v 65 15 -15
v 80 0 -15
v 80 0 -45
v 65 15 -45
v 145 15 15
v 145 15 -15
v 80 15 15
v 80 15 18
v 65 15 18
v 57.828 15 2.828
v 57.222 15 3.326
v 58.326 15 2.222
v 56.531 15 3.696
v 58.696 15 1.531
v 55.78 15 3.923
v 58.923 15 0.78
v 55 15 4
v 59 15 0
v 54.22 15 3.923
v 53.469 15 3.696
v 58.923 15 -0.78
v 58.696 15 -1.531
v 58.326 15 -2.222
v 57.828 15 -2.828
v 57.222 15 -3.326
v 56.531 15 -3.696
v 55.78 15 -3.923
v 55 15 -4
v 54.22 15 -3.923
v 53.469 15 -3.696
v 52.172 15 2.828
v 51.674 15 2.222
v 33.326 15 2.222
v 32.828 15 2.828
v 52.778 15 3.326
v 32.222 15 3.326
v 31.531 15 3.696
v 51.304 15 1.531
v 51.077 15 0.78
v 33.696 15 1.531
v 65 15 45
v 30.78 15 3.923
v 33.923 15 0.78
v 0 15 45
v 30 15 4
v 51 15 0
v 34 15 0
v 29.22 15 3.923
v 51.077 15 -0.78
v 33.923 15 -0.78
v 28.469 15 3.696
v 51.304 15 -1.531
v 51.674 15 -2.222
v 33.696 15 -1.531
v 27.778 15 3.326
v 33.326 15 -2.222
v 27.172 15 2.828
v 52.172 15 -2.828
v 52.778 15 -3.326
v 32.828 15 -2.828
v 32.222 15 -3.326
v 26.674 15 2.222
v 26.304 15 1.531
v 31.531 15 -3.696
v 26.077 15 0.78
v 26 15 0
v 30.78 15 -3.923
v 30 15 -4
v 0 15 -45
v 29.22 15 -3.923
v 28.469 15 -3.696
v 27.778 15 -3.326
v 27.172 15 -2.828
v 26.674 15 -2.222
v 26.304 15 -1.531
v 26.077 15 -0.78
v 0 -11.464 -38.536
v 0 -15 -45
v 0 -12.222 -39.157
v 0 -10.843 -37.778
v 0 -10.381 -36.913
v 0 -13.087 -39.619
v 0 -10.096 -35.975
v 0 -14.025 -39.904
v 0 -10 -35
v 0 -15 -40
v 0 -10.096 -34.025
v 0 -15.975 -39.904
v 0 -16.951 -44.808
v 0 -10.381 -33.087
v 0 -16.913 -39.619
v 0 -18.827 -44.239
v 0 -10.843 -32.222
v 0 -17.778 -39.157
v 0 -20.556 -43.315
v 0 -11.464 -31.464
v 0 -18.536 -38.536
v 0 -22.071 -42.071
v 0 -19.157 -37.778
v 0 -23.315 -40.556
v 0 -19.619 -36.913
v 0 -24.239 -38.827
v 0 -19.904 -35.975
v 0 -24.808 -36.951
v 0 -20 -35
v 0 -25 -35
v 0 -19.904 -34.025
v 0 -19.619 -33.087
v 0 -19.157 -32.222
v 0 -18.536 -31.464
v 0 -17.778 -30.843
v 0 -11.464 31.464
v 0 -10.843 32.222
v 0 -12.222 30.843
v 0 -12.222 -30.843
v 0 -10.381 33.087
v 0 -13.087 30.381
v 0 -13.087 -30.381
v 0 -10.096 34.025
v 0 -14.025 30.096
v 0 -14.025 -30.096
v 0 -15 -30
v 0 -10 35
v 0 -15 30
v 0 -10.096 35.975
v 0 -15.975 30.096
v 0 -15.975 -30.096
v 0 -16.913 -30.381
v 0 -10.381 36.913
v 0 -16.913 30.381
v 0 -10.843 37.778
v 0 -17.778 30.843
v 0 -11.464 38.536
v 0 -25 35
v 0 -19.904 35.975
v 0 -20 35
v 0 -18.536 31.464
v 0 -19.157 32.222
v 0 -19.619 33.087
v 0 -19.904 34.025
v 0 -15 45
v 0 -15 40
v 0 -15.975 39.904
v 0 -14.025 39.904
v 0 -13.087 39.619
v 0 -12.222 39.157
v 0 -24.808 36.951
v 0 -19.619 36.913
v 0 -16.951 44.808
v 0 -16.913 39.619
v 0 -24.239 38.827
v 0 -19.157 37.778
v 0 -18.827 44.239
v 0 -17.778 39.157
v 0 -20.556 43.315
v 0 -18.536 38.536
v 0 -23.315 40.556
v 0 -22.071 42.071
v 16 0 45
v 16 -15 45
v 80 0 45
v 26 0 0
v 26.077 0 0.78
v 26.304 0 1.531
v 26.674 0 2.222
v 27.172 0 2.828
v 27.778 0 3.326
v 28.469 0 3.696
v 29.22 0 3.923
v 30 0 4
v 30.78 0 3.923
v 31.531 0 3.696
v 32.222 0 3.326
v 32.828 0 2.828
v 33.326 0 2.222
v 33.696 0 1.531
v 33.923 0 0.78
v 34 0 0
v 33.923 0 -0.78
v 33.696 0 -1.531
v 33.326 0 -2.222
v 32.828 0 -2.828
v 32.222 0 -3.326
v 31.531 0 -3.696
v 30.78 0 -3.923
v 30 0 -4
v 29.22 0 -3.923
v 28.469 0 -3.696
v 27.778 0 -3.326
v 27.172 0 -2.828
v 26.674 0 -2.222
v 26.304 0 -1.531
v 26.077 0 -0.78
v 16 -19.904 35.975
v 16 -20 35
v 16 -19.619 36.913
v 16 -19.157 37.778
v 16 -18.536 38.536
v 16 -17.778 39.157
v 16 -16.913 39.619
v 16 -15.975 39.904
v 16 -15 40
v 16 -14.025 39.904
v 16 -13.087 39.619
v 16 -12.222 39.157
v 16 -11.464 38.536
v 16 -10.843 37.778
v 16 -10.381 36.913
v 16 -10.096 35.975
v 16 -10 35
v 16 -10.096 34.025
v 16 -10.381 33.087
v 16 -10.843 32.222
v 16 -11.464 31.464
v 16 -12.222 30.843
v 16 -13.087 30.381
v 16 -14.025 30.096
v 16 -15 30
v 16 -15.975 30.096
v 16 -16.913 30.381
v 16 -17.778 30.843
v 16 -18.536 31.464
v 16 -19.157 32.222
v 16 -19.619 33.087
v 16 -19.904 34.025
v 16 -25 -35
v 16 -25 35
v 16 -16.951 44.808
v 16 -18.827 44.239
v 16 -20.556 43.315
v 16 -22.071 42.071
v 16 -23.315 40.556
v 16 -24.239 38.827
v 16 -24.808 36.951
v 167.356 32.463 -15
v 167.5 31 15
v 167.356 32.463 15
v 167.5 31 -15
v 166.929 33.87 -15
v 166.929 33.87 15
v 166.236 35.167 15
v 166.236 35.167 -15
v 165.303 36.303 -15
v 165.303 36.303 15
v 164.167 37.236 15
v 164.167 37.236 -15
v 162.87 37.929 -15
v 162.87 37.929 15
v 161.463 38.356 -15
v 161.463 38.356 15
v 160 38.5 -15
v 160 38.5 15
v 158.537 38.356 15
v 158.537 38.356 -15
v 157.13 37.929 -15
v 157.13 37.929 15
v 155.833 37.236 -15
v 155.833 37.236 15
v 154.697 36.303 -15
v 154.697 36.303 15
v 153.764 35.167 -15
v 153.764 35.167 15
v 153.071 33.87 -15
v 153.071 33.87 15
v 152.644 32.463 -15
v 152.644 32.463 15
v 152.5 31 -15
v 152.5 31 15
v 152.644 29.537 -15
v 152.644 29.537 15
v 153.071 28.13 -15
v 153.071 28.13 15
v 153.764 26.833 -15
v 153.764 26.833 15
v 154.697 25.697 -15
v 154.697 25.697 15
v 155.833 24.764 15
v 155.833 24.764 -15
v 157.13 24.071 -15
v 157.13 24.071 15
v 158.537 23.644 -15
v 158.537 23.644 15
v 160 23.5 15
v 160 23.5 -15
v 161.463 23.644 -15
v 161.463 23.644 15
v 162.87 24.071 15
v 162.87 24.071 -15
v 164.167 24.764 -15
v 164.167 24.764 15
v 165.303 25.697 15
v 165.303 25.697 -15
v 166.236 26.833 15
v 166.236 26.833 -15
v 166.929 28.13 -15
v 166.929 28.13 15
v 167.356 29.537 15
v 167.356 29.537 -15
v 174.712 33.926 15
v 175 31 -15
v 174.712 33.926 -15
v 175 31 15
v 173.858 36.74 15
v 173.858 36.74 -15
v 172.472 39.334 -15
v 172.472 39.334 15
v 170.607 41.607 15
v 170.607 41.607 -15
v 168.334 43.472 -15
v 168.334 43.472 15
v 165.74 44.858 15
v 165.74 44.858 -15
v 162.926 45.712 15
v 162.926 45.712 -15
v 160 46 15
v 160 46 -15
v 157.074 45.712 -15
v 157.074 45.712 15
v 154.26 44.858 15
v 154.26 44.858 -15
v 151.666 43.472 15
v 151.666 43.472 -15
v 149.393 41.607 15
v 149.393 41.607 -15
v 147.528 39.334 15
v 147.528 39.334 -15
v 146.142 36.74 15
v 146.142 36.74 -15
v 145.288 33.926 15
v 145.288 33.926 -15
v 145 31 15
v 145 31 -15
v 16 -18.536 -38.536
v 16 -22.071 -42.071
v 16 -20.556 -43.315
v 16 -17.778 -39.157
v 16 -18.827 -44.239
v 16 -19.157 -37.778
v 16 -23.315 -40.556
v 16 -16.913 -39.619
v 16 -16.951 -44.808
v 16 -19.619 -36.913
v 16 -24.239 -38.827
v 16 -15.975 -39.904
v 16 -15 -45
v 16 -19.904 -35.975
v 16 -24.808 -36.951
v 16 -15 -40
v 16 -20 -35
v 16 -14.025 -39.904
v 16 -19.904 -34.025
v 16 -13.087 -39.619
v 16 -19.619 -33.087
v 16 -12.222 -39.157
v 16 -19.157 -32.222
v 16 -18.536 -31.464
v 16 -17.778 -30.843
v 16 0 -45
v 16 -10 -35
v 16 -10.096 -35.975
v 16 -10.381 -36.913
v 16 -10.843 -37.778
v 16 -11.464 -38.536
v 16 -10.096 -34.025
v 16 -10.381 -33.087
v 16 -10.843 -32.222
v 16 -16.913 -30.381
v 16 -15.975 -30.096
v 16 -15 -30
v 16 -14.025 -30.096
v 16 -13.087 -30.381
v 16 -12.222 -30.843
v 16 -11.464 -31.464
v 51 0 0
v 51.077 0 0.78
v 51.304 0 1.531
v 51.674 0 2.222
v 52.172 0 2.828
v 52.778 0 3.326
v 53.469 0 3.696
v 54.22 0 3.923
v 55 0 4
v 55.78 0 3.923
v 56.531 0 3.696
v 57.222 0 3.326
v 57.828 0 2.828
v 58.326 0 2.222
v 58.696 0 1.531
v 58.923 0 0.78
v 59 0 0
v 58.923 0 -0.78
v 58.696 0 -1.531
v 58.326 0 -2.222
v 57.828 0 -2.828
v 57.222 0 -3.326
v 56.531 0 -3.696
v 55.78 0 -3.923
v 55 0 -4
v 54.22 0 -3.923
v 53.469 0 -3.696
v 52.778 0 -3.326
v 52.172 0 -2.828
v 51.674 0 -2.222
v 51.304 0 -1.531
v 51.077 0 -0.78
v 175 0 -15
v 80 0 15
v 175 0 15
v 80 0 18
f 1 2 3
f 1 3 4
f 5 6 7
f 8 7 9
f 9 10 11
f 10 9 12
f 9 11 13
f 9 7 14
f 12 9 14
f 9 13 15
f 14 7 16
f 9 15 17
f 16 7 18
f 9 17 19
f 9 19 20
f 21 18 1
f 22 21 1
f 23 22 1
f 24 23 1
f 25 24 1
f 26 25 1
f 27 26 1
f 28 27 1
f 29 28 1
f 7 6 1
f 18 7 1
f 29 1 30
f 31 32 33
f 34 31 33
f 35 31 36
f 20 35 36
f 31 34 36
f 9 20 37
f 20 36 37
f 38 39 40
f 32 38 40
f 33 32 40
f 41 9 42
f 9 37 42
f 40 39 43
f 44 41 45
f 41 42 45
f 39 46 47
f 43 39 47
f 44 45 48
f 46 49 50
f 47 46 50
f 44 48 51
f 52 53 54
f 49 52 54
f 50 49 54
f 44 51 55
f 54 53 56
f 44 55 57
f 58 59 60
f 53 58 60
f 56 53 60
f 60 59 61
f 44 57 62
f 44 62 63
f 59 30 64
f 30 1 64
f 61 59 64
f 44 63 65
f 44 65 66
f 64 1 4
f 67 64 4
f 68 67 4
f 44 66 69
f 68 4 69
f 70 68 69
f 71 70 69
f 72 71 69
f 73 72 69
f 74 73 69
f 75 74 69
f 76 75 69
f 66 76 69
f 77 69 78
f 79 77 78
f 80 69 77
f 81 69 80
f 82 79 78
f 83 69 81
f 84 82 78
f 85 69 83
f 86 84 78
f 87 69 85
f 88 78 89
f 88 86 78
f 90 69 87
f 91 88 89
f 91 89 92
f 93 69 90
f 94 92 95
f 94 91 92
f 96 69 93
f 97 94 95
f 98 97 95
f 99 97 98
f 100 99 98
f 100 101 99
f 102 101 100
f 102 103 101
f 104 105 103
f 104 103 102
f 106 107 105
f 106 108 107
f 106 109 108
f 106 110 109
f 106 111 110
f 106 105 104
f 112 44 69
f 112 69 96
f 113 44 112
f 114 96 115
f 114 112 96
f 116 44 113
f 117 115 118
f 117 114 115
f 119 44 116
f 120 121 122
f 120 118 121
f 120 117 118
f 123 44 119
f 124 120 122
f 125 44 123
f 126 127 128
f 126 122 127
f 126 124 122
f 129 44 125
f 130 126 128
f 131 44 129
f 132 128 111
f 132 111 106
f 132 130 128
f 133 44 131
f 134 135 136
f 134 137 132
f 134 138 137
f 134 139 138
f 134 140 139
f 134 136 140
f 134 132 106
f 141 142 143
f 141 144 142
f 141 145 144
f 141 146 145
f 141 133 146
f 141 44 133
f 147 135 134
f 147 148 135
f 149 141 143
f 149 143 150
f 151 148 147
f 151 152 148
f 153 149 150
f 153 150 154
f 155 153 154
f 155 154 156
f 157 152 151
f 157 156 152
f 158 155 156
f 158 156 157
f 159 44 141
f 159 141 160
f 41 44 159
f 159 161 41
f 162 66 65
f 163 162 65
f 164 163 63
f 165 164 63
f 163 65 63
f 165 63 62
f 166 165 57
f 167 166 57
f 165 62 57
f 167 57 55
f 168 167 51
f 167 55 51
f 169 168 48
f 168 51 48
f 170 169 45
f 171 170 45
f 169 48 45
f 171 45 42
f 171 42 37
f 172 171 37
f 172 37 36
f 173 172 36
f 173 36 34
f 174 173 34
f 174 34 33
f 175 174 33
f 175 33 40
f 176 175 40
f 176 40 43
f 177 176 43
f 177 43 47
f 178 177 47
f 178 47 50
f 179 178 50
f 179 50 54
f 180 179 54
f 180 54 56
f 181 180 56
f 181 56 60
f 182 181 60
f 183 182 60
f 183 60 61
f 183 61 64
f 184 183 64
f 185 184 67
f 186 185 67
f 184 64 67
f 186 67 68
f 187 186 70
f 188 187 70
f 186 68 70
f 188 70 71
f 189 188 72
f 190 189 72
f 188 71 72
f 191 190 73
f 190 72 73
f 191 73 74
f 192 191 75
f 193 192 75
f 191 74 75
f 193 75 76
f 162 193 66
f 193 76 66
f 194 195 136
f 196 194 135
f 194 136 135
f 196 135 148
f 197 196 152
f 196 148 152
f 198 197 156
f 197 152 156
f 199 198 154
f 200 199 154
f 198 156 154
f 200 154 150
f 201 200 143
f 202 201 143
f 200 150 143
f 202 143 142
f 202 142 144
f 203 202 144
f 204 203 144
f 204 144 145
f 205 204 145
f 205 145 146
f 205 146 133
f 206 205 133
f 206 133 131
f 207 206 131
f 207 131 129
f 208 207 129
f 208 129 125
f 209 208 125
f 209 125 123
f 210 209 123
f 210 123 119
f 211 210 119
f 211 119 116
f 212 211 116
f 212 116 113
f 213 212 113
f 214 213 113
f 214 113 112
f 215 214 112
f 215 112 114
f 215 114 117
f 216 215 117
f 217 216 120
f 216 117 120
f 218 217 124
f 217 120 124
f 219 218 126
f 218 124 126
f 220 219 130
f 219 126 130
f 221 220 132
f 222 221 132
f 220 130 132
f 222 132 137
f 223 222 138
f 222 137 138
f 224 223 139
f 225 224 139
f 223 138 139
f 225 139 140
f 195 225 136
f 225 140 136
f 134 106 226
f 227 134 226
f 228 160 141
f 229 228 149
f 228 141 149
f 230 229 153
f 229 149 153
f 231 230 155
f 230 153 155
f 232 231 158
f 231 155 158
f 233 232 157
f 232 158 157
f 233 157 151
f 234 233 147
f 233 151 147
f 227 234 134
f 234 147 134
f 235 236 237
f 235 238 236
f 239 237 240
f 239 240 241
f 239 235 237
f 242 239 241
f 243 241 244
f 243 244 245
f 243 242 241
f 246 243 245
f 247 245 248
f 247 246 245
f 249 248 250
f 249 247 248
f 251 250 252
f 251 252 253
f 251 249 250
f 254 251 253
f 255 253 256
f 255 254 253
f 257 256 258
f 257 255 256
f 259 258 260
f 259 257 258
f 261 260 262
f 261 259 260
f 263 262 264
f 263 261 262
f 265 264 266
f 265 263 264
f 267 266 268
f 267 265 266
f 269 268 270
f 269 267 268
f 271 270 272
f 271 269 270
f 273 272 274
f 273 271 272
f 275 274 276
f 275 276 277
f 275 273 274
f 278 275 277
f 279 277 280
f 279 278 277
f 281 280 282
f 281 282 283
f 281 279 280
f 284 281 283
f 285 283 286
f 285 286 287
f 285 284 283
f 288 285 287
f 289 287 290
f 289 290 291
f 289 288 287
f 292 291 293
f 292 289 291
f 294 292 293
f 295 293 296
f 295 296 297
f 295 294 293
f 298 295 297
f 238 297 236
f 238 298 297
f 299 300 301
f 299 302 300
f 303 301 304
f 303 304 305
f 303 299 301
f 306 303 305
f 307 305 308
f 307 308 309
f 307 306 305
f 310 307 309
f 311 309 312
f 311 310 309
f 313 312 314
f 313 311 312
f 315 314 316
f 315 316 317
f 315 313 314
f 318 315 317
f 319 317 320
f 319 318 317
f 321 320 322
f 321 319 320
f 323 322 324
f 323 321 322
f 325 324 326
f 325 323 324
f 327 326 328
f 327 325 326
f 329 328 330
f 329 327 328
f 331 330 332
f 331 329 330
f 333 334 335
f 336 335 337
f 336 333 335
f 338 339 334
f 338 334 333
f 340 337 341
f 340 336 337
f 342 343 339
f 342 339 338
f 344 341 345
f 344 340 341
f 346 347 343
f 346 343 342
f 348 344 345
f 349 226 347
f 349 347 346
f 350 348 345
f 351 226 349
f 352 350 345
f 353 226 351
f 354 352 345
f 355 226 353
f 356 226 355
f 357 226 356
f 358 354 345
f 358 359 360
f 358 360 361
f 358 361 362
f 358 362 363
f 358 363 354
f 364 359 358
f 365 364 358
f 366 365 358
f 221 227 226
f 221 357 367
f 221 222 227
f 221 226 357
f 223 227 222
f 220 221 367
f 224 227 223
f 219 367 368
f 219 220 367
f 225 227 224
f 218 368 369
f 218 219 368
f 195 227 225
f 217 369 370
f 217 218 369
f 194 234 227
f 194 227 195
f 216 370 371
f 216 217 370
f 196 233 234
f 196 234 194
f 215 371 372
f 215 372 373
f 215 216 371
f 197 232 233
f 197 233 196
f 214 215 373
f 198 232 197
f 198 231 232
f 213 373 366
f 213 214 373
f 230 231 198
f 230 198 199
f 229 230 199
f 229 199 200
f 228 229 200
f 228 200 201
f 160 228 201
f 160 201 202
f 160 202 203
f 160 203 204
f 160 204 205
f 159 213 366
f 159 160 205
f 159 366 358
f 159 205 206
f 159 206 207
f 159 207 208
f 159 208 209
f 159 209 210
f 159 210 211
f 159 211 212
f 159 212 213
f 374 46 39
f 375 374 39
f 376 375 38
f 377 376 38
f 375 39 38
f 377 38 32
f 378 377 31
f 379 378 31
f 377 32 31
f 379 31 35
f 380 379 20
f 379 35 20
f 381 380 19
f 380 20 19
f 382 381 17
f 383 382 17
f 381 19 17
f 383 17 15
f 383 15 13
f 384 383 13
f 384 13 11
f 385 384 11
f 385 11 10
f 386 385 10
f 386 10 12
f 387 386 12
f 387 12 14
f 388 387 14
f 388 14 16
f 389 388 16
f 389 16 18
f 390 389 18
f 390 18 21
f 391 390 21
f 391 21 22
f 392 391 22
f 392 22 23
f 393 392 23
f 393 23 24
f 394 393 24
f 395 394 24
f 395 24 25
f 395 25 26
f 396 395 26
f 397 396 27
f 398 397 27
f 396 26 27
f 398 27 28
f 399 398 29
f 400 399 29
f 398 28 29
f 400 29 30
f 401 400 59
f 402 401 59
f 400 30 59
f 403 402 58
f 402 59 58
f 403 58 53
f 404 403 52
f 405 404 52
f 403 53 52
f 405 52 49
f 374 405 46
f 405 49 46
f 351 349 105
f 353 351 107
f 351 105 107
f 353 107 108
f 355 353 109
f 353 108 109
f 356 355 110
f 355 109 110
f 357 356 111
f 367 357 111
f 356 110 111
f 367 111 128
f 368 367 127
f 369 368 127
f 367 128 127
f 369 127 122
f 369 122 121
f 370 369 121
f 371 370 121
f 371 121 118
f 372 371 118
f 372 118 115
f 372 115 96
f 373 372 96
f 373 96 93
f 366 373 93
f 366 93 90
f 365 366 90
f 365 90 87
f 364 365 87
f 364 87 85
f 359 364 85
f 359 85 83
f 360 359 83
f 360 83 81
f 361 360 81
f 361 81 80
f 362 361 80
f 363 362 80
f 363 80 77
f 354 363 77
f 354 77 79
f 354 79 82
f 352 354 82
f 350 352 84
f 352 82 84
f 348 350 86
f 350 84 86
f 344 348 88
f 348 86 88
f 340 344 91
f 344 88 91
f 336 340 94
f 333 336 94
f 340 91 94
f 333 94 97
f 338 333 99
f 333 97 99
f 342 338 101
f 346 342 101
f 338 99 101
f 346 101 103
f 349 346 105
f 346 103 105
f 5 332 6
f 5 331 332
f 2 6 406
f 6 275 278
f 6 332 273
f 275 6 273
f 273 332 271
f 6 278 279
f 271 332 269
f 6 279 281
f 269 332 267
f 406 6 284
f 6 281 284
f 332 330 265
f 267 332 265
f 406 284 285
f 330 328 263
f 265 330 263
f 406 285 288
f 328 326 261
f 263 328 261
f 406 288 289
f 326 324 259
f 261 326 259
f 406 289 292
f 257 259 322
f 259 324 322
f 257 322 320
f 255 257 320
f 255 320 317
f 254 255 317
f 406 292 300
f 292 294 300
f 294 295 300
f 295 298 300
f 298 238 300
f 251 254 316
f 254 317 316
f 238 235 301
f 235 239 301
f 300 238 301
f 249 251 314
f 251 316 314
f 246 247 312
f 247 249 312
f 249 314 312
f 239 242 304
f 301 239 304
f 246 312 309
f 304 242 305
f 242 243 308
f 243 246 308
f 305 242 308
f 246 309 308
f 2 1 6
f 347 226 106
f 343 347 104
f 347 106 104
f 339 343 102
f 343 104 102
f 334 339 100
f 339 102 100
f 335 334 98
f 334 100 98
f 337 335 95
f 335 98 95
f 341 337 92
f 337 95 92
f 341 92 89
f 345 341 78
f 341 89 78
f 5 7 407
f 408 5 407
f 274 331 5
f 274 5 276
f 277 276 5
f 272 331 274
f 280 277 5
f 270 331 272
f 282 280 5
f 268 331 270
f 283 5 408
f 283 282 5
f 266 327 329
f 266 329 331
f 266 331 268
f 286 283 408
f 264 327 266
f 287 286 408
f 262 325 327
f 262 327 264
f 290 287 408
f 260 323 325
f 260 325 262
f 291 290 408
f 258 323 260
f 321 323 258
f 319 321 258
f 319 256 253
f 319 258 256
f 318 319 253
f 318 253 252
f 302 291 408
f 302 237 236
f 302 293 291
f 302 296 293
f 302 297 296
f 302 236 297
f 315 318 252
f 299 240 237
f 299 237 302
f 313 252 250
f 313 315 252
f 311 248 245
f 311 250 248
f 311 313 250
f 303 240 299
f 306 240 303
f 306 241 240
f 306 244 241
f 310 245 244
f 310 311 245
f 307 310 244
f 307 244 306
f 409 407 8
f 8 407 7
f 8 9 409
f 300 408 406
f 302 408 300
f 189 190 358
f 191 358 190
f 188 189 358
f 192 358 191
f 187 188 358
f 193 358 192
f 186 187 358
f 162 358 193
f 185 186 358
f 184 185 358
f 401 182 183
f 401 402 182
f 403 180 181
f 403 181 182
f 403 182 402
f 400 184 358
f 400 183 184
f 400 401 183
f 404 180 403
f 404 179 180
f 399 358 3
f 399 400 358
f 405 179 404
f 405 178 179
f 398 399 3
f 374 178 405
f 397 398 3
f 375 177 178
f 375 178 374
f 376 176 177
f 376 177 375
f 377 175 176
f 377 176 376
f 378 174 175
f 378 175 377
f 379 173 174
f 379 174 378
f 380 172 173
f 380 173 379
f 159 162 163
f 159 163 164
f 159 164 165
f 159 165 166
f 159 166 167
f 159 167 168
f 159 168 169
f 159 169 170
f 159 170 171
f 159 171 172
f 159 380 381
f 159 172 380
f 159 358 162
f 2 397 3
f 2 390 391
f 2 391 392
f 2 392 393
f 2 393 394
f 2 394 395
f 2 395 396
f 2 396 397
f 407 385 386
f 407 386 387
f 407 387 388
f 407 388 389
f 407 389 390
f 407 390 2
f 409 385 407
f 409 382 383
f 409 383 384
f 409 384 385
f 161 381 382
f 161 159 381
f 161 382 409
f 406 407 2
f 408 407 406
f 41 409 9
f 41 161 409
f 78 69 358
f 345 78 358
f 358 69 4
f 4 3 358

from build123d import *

# Parameters (mm, degrees)
SKETCH1_R                = 7.5
BOSS_EXTRUDE1_DEPTH      = 15
BOSS_EXTRUDE2_DEPTH      = 45
BOSS_EXTRUDE3_DEPTH      = 18
BOSS_EXTRUDE3_DEPTH_BACK = 15
CUT_EXTRUDE1_REACH       = 187.068
SKETCH2_R                = 4
CUT_EXTRUDE2_REACH       = 188.456
SKETCH3_R                = 5


with BuildPart() as part:
    # Sketch1 → Boss-Extrude1 (new, symmetric)
    with BuildSketch(Plane.XY):
        with BuildLine():
            Line((145, 15), (80, 15))
            Line((80, 15), (80, 0))
            Line((80, 0), (175, 0))
            Line((175, 0), (175, 31))
            ThreePointArc((175, 31), (160, 46), (145, 31))
            Line((145, 31), (145, 15))
        make_face()
        with Locations((160, 31)):
            Circle(SKETCH1_R, mode=Mode.SUBTRACT)
    extrude(amount=BOSS_EXTRUDE1_DEPTH, both=True)



with BuildPart() as body_2:
    # Sketch1<3> → Boss-Extrude2 (new, symmetric)
    with BuildSketch(Plane.XY):
        Polygon((65, 15), (0, 15), (0, -25), (16, -25), (16, 0), (80, 0), align=None)
    extrude(amount=BOSS_EXTRUDE2_DEPTH, both=True)


with BuildPart() as part_1:
    add(part.part)

    add(body_2.part)  # Boss-Extrude3 merges body 2
    # Sketch1<4> → Boss-Extrude3 (add, two sides: drawn at the far end of the back side and taken through both)
    with BuildSketch(Plane.XY.offset(-BOSS_EXTRUDE3_DEPTH_BACK)):
        Polygon((80, 15), (65, 15), (80, 0), align=None)
    extrude(amount=BOSS_EXTRUDE3_DEPTH + BOSS_EXTRUDE3_DEPTH_BACK)

    # Sketch2 → Cut-Extrude1 (cut, up to next)
    with BuildSketch(Plane(origin=(0, 15, 0), x_dir=(1, 0, 0), z_dir=(0, 1, 0)), mode=Mode.PRIVATE) as cut_extrude1_sk1:
        with Locations((55, 0)):
            Circle(SKETCH2_R)
    cut_extrude1_tool1 = extrude(cut_extrude1_sk1.sketch, amount=-CUT_EXTRUDE1_REACH, mode=Mode.PRIVATE) & part_1.part
    # Sketch2 → Cut-Extrude1 (cut, up to next)
    with BuildSketch(Plane(origin=(0, 15, 0), x_dir=(1, 0, 0), z_dir=(0, 1, 0)), mode=Mode.PRIVATE) as cut_extrude1_sk2:
        with Locations((30, 0)):
            Circle(SKETCH2_R)
    cut_extrude1_tool2 = extrude(cut_extrude1_sk2.sketch, amount=-CUT_EXTRUDE1_REACH, mode=Mode.PRIVATE) & part_1.part
    add(cut_extrude1_tool1.solids().sort_by_distance((55, 15, 0))[0], mode=Mode.SUBTRACT)
    add(cut_extrude1_tool2.solids().sort_by_distance((30, 15, 0))[0], mode=Mode.SUBTRACT)

    # Sketch3 → Cut-Extrude2 (cut, up to next)
    with BuildSketch(Plane.ZY, mode=Mode.PRIVATE) as cut_extrude2_sk1:
        with Locations((35, -15)):
            Circle(SKETCH3_R)
    cut_extrude2_tool1 = extrude(cut_extrude2_sk1.sketch, amount=-CUT_EXTRUDE2_REACH, mode=Mode.PRIVATE) & part_1.part
    # Sketch3 → Cut-Extrude2 (cut, up to next)
    with BuildSketch(Plane.ZY, mode=Mode.PRIVATE) as cut_extrude2_sk2:
        with BuildLine():
            Line((45, -25), (45, -15))
            ThreePointArc((45, -15), (42.071067812, -22.071067812), (35, -25))
            Line((35, -25), (45, -25))
        make_face()
    cut_extrude2_tool2 = extrude(cut_extrude2_sk2.sketch, amount=-CUT_EXTRUDE2_REACH, mode=Mode.PRIVATE) & part_1.part
    # Sketch3 → Cut-Extrude2 (cut, up to next)
    with BuildSketch(Plane.ZY, mode=Mode.PRIVATE) as cut_extrude2_sk3:
        with BuildLine():
            Line((-45, -25), (-35, -25))
            ThreePointArc((-35, -25), (-42.071067806, -22.071067818), (-45, -15.000000016))
            Line((-45, -15.000000016), (-45, -25))
        make_face()
    cut_extrude2_tool3 = extrude(cut_extrude2_sk3.sketch, amount=-CUT_EXTRUDE2_REACH, mode=Mode.PRIVATE) & part_1.part
    # Sketch3 → Cut-Extrude2 (cut, up to next)
    with BuildSketch(Plane.ZY, mode=Mode.PRIVATE) as cut_extrude2_sk4:
        with Locations((-35, -15)):
            Circle(SKETCH3_R)
    cut_extrude2_tool4 = extrude(cut_extrude2_sk4.sketch, amount=-CUT_EXTRUDE2_REACH, mode=Mode.PRIVATE) & part_1.part
    add(cut_extrude2_tool1.solids().sort_by_distance((0, -15, 35))[0], mode=Mode.SUBTRACT)
    add(cut_extrude2_tool2.solids().sort_by_distance((0, -22.766321, 42.766321))[0], mode=Mode.SUBTRACT)
    add(cut_extrude2_tool3.solids().sort_by_distance((0, -22.766321, -42.766321))[0], mode=Mode.SUBTRACT)
    add(cut_extrude2_tool4.solids().sort_by_distance((0, -15, -35))[0], mode=Mode.SUBTRACT)


solid = part_1.part
